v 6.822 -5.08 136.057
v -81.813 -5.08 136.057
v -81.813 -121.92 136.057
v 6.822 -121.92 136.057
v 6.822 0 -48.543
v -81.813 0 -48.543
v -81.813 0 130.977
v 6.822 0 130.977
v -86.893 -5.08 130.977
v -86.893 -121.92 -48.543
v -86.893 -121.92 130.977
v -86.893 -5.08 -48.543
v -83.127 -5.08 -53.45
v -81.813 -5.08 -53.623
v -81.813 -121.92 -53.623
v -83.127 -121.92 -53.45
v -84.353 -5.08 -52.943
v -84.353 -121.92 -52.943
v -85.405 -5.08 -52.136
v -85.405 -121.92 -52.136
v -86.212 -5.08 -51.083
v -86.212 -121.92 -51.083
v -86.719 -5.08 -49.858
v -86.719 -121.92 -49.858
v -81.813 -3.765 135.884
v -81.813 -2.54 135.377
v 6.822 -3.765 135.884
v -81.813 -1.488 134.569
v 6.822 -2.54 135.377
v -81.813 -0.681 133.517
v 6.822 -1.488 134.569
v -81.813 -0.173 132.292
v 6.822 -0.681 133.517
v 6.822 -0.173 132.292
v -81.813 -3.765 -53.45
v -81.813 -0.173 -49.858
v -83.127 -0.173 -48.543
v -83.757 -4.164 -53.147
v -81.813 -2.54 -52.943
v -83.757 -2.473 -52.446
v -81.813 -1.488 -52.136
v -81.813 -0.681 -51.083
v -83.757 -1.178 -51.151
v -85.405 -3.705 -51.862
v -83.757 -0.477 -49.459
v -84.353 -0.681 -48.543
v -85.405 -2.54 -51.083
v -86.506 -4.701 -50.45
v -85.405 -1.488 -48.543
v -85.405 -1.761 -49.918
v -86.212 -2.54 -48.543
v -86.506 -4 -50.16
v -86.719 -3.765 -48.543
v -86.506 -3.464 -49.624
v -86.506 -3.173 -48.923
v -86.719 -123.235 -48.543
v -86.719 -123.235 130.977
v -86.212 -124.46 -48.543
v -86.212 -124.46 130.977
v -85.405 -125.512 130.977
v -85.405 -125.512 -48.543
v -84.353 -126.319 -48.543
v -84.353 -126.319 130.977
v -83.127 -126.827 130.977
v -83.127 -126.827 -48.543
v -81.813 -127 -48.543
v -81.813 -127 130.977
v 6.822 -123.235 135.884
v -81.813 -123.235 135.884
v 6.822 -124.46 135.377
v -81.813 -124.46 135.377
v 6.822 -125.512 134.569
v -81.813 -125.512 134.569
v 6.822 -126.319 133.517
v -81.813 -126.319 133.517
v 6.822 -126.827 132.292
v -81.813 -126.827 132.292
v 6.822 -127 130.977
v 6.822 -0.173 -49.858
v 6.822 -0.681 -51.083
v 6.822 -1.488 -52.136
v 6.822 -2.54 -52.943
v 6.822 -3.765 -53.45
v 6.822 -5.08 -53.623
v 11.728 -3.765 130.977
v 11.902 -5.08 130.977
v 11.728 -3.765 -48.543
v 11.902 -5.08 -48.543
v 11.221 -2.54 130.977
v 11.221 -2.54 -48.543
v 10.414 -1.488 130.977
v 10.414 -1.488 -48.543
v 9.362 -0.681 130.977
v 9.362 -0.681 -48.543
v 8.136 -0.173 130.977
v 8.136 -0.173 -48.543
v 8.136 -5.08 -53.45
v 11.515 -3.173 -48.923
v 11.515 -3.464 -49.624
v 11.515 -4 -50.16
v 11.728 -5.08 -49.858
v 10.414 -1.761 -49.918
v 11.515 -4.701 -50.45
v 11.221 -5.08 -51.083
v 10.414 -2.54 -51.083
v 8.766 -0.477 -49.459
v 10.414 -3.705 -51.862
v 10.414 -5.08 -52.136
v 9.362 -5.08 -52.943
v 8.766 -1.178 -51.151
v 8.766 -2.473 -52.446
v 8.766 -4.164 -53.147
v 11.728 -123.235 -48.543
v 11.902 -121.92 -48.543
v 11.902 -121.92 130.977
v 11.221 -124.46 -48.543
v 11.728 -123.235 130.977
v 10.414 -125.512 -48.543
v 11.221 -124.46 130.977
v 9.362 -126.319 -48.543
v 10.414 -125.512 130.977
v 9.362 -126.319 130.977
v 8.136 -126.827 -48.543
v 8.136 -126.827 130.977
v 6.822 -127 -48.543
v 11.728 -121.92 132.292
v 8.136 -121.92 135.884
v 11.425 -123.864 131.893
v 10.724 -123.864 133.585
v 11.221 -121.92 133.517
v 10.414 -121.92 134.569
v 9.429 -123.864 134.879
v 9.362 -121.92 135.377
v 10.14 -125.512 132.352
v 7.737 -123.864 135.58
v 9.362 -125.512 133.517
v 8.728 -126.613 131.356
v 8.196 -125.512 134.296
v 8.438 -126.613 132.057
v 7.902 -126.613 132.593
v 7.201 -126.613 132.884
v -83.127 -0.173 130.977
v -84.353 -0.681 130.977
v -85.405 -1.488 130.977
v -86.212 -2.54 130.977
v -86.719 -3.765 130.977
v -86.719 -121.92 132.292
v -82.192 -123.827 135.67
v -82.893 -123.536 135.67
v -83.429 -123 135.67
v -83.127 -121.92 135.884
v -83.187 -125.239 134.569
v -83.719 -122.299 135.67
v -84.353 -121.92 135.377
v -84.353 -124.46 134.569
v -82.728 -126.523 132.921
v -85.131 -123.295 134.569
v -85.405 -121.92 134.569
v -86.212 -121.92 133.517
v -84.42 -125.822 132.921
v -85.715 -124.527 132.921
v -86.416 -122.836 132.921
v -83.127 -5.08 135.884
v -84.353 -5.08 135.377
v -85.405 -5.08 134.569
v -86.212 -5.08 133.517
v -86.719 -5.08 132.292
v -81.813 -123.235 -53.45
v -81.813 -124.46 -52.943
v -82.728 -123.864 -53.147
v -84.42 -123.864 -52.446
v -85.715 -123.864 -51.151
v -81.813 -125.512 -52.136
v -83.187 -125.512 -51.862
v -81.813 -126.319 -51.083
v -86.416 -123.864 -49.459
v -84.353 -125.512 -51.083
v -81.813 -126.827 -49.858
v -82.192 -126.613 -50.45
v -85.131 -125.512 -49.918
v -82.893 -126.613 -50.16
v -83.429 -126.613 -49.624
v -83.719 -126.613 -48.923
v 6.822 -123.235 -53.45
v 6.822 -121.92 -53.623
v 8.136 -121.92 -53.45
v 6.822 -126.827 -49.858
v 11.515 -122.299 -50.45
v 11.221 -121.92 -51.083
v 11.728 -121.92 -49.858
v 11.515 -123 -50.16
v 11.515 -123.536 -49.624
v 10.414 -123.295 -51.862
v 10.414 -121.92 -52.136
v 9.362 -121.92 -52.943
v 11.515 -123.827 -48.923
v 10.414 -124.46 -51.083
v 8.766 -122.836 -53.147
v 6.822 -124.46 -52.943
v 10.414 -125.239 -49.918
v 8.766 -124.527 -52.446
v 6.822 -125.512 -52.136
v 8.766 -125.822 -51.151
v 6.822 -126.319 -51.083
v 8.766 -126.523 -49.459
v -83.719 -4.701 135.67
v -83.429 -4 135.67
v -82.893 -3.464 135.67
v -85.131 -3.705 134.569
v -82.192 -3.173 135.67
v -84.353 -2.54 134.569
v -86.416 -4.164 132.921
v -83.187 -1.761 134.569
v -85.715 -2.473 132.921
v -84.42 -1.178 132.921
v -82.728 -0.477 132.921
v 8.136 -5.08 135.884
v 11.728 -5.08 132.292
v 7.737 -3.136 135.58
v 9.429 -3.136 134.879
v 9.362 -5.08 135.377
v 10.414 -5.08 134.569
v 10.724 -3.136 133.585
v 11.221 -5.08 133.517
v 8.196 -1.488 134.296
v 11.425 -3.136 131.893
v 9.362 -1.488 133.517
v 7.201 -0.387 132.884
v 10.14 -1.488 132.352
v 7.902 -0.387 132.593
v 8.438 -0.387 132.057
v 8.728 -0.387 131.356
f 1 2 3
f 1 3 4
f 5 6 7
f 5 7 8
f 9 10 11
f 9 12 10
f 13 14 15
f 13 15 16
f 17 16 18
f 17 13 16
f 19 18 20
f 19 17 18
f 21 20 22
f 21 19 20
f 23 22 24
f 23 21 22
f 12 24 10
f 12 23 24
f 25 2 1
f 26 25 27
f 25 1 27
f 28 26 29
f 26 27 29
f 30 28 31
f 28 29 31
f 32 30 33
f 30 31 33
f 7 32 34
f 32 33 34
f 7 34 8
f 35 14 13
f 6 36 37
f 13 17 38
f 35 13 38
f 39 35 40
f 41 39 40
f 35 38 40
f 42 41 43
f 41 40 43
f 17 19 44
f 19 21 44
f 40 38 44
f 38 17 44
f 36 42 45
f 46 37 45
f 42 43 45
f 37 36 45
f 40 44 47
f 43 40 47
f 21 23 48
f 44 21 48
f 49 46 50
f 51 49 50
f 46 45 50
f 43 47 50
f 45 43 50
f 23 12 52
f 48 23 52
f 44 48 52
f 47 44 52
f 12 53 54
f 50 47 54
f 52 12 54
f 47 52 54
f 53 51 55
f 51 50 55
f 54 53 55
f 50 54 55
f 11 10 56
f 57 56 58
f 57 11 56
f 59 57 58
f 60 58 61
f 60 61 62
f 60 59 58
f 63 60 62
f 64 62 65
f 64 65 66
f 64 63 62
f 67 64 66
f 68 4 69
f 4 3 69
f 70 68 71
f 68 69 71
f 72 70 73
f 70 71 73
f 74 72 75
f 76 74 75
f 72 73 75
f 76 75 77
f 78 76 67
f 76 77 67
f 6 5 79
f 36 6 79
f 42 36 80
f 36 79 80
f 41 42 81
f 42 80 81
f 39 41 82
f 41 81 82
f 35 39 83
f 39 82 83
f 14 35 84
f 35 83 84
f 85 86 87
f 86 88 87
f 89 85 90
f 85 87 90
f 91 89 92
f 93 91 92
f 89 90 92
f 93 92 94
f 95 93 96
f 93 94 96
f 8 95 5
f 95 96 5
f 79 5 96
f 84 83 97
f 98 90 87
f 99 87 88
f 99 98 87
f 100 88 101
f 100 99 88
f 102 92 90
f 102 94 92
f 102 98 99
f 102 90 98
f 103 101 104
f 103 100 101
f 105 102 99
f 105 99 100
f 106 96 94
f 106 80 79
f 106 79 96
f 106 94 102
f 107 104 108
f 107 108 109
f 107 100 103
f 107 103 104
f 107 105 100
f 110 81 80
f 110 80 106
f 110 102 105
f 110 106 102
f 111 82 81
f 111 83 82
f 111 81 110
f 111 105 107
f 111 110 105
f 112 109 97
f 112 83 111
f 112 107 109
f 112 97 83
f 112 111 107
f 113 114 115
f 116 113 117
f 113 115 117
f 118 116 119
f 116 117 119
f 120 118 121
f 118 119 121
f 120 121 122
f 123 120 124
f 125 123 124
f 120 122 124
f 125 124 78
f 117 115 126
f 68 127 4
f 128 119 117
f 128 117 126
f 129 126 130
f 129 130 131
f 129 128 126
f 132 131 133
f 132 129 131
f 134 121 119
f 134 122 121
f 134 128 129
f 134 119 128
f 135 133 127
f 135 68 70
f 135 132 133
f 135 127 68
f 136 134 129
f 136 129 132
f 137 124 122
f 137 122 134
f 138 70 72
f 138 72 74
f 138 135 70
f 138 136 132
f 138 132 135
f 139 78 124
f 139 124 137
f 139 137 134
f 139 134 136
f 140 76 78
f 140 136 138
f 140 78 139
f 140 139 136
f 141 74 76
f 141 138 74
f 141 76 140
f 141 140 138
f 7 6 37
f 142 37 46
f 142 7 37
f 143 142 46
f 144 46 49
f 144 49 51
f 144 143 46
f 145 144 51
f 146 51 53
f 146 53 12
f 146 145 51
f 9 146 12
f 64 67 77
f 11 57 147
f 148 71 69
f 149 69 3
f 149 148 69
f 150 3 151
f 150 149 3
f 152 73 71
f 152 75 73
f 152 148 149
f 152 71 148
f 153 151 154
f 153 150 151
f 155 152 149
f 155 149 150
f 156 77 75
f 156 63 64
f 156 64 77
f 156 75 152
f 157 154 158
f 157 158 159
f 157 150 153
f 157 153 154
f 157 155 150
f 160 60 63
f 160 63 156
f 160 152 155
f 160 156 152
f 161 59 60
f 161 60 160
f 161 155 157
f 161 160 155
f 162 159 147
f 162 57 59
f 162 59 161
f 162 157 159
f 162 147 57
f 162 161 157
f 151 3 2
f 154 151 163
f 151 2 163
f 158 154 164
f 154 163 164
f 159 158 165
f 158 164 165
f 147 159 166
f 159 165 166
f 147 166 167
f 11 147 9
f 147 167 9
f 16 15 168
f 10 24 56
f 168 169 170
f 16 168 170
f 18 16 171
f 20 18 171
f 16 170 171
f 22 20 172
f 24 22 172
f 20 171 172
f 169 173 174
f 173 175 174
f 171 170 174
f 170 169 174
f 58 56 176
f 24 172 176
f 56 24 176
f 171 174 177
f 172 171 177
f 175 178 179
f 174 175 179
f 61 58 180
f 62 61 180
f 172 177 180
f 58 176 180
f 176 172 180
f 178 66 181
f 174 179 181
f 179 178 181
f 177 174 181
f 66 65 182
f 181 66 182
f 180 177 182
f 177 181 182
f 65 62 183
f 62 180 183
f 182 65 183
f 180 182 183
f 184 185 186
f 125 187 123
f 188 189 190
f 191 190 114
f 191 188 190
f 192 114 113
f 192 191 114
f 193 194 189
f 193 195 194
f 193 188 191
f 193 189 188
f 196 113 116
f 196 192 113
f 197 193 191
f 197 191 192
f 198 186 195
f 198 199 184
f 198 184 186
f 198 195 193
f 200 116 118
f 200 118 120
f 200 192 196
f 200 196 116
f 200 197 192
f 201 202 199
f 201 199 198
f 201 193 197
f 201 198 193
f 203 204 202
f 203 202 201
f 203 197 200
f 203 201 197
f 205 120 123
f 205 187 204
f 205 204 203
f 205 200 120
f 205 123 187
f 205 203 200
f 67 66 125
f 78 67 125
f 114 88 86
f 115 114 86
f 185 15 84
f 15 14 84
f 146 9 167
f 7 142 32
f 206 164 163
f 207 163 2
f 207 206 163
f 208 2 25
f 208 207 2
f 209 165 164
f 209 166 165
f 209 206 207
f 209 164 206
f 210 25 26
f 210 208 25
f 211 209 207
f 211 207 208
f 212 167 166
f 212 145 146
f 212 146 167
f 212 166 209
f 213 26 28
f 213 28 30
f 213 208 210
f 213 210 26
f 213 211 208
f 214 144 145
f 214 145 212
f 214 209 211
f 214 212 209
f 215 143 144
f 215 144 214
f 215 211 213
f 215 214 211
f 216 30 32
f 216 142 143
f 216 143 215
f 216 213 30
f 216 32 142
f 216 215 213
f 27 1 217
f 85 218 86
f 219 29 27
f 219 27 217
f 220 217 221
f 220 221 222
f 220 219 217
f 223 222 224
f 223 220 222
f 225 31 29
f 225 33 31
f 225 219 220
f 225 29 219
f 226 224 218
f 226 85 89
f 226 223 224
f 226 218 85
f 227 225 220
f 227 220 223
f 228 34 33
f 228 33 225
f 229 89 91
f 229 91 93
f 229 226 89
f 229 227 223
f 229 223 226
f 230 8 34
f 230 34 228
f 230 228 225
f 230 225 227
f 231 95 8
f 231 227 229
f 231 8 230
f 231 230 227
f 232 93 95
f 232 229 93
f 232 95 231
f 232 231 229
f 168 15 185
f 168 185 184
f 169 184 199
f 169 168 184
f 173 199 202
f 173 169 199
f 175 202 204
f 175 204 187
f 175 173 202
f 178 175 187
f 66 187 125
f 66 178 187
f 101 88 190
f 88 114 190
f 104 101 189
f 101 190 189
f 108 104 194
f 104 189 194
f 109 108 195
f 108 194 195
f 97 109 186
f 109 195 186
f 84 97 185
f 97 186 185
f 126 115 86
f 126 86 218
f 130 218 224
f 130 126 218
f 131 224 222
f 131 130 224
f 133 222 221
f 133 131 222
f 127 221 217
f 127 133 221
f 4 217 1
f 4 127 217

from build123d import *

# Parameters (mm, degrees)
F0_W     = 98.794114
F0_H     = 189.680554
F1_DEPTH = 127
F2_R     = 5.08
F3_R     = 5.08
F4_R     = 5.08
F5_R     = 5.08
F6_R     = 5.08


with BuildPart() as f1:
    # F0 (on Front) → F1 (new body)
    with BuildSketch(Plane.XZ):
        with Locations((-37.495473, 41.216817)):
            Rectangle(F0_W, F0_H)
    extrude(amount=F1_DEPTH)

    # F2
    f2_edges = [f1.edges().sort_by_distance(p)[0] for p in [
        (11.901584, -63.5, 136.057094),
    ]]
    fillet(f2_edges, radius=F2_R)

    # F3
    f3_edges = [f1.edges().sort_by_distance(p)[0] for p in [
        (-37.495473, 0, -53.62346),
    ]]
    fillet(f3_edges, radius=F3_R)

    # F4
    f4_edges = [f1.edges().sort_by_distance(p)[0] for p in [
        (-86.89253, 0, 43.756817),
    ]]
    fillet(f4_edges, radius=F4_R)

    # F5
    f5_edges = [f1.edges().sort_by_distance(p)[0] for p in [
        (-86.89253, -127, 43.756817),
    ]]
    fillet(f5_edges, radius=F5_R)

    # F6
    f6_edges = [f1.edges().sort_by_distance(p)[0] for p in [
        (11.901584, -63.5, -53.62346),
    ]]
    fillet(f6_edges, radius=F6_R)


solid = f1.part
